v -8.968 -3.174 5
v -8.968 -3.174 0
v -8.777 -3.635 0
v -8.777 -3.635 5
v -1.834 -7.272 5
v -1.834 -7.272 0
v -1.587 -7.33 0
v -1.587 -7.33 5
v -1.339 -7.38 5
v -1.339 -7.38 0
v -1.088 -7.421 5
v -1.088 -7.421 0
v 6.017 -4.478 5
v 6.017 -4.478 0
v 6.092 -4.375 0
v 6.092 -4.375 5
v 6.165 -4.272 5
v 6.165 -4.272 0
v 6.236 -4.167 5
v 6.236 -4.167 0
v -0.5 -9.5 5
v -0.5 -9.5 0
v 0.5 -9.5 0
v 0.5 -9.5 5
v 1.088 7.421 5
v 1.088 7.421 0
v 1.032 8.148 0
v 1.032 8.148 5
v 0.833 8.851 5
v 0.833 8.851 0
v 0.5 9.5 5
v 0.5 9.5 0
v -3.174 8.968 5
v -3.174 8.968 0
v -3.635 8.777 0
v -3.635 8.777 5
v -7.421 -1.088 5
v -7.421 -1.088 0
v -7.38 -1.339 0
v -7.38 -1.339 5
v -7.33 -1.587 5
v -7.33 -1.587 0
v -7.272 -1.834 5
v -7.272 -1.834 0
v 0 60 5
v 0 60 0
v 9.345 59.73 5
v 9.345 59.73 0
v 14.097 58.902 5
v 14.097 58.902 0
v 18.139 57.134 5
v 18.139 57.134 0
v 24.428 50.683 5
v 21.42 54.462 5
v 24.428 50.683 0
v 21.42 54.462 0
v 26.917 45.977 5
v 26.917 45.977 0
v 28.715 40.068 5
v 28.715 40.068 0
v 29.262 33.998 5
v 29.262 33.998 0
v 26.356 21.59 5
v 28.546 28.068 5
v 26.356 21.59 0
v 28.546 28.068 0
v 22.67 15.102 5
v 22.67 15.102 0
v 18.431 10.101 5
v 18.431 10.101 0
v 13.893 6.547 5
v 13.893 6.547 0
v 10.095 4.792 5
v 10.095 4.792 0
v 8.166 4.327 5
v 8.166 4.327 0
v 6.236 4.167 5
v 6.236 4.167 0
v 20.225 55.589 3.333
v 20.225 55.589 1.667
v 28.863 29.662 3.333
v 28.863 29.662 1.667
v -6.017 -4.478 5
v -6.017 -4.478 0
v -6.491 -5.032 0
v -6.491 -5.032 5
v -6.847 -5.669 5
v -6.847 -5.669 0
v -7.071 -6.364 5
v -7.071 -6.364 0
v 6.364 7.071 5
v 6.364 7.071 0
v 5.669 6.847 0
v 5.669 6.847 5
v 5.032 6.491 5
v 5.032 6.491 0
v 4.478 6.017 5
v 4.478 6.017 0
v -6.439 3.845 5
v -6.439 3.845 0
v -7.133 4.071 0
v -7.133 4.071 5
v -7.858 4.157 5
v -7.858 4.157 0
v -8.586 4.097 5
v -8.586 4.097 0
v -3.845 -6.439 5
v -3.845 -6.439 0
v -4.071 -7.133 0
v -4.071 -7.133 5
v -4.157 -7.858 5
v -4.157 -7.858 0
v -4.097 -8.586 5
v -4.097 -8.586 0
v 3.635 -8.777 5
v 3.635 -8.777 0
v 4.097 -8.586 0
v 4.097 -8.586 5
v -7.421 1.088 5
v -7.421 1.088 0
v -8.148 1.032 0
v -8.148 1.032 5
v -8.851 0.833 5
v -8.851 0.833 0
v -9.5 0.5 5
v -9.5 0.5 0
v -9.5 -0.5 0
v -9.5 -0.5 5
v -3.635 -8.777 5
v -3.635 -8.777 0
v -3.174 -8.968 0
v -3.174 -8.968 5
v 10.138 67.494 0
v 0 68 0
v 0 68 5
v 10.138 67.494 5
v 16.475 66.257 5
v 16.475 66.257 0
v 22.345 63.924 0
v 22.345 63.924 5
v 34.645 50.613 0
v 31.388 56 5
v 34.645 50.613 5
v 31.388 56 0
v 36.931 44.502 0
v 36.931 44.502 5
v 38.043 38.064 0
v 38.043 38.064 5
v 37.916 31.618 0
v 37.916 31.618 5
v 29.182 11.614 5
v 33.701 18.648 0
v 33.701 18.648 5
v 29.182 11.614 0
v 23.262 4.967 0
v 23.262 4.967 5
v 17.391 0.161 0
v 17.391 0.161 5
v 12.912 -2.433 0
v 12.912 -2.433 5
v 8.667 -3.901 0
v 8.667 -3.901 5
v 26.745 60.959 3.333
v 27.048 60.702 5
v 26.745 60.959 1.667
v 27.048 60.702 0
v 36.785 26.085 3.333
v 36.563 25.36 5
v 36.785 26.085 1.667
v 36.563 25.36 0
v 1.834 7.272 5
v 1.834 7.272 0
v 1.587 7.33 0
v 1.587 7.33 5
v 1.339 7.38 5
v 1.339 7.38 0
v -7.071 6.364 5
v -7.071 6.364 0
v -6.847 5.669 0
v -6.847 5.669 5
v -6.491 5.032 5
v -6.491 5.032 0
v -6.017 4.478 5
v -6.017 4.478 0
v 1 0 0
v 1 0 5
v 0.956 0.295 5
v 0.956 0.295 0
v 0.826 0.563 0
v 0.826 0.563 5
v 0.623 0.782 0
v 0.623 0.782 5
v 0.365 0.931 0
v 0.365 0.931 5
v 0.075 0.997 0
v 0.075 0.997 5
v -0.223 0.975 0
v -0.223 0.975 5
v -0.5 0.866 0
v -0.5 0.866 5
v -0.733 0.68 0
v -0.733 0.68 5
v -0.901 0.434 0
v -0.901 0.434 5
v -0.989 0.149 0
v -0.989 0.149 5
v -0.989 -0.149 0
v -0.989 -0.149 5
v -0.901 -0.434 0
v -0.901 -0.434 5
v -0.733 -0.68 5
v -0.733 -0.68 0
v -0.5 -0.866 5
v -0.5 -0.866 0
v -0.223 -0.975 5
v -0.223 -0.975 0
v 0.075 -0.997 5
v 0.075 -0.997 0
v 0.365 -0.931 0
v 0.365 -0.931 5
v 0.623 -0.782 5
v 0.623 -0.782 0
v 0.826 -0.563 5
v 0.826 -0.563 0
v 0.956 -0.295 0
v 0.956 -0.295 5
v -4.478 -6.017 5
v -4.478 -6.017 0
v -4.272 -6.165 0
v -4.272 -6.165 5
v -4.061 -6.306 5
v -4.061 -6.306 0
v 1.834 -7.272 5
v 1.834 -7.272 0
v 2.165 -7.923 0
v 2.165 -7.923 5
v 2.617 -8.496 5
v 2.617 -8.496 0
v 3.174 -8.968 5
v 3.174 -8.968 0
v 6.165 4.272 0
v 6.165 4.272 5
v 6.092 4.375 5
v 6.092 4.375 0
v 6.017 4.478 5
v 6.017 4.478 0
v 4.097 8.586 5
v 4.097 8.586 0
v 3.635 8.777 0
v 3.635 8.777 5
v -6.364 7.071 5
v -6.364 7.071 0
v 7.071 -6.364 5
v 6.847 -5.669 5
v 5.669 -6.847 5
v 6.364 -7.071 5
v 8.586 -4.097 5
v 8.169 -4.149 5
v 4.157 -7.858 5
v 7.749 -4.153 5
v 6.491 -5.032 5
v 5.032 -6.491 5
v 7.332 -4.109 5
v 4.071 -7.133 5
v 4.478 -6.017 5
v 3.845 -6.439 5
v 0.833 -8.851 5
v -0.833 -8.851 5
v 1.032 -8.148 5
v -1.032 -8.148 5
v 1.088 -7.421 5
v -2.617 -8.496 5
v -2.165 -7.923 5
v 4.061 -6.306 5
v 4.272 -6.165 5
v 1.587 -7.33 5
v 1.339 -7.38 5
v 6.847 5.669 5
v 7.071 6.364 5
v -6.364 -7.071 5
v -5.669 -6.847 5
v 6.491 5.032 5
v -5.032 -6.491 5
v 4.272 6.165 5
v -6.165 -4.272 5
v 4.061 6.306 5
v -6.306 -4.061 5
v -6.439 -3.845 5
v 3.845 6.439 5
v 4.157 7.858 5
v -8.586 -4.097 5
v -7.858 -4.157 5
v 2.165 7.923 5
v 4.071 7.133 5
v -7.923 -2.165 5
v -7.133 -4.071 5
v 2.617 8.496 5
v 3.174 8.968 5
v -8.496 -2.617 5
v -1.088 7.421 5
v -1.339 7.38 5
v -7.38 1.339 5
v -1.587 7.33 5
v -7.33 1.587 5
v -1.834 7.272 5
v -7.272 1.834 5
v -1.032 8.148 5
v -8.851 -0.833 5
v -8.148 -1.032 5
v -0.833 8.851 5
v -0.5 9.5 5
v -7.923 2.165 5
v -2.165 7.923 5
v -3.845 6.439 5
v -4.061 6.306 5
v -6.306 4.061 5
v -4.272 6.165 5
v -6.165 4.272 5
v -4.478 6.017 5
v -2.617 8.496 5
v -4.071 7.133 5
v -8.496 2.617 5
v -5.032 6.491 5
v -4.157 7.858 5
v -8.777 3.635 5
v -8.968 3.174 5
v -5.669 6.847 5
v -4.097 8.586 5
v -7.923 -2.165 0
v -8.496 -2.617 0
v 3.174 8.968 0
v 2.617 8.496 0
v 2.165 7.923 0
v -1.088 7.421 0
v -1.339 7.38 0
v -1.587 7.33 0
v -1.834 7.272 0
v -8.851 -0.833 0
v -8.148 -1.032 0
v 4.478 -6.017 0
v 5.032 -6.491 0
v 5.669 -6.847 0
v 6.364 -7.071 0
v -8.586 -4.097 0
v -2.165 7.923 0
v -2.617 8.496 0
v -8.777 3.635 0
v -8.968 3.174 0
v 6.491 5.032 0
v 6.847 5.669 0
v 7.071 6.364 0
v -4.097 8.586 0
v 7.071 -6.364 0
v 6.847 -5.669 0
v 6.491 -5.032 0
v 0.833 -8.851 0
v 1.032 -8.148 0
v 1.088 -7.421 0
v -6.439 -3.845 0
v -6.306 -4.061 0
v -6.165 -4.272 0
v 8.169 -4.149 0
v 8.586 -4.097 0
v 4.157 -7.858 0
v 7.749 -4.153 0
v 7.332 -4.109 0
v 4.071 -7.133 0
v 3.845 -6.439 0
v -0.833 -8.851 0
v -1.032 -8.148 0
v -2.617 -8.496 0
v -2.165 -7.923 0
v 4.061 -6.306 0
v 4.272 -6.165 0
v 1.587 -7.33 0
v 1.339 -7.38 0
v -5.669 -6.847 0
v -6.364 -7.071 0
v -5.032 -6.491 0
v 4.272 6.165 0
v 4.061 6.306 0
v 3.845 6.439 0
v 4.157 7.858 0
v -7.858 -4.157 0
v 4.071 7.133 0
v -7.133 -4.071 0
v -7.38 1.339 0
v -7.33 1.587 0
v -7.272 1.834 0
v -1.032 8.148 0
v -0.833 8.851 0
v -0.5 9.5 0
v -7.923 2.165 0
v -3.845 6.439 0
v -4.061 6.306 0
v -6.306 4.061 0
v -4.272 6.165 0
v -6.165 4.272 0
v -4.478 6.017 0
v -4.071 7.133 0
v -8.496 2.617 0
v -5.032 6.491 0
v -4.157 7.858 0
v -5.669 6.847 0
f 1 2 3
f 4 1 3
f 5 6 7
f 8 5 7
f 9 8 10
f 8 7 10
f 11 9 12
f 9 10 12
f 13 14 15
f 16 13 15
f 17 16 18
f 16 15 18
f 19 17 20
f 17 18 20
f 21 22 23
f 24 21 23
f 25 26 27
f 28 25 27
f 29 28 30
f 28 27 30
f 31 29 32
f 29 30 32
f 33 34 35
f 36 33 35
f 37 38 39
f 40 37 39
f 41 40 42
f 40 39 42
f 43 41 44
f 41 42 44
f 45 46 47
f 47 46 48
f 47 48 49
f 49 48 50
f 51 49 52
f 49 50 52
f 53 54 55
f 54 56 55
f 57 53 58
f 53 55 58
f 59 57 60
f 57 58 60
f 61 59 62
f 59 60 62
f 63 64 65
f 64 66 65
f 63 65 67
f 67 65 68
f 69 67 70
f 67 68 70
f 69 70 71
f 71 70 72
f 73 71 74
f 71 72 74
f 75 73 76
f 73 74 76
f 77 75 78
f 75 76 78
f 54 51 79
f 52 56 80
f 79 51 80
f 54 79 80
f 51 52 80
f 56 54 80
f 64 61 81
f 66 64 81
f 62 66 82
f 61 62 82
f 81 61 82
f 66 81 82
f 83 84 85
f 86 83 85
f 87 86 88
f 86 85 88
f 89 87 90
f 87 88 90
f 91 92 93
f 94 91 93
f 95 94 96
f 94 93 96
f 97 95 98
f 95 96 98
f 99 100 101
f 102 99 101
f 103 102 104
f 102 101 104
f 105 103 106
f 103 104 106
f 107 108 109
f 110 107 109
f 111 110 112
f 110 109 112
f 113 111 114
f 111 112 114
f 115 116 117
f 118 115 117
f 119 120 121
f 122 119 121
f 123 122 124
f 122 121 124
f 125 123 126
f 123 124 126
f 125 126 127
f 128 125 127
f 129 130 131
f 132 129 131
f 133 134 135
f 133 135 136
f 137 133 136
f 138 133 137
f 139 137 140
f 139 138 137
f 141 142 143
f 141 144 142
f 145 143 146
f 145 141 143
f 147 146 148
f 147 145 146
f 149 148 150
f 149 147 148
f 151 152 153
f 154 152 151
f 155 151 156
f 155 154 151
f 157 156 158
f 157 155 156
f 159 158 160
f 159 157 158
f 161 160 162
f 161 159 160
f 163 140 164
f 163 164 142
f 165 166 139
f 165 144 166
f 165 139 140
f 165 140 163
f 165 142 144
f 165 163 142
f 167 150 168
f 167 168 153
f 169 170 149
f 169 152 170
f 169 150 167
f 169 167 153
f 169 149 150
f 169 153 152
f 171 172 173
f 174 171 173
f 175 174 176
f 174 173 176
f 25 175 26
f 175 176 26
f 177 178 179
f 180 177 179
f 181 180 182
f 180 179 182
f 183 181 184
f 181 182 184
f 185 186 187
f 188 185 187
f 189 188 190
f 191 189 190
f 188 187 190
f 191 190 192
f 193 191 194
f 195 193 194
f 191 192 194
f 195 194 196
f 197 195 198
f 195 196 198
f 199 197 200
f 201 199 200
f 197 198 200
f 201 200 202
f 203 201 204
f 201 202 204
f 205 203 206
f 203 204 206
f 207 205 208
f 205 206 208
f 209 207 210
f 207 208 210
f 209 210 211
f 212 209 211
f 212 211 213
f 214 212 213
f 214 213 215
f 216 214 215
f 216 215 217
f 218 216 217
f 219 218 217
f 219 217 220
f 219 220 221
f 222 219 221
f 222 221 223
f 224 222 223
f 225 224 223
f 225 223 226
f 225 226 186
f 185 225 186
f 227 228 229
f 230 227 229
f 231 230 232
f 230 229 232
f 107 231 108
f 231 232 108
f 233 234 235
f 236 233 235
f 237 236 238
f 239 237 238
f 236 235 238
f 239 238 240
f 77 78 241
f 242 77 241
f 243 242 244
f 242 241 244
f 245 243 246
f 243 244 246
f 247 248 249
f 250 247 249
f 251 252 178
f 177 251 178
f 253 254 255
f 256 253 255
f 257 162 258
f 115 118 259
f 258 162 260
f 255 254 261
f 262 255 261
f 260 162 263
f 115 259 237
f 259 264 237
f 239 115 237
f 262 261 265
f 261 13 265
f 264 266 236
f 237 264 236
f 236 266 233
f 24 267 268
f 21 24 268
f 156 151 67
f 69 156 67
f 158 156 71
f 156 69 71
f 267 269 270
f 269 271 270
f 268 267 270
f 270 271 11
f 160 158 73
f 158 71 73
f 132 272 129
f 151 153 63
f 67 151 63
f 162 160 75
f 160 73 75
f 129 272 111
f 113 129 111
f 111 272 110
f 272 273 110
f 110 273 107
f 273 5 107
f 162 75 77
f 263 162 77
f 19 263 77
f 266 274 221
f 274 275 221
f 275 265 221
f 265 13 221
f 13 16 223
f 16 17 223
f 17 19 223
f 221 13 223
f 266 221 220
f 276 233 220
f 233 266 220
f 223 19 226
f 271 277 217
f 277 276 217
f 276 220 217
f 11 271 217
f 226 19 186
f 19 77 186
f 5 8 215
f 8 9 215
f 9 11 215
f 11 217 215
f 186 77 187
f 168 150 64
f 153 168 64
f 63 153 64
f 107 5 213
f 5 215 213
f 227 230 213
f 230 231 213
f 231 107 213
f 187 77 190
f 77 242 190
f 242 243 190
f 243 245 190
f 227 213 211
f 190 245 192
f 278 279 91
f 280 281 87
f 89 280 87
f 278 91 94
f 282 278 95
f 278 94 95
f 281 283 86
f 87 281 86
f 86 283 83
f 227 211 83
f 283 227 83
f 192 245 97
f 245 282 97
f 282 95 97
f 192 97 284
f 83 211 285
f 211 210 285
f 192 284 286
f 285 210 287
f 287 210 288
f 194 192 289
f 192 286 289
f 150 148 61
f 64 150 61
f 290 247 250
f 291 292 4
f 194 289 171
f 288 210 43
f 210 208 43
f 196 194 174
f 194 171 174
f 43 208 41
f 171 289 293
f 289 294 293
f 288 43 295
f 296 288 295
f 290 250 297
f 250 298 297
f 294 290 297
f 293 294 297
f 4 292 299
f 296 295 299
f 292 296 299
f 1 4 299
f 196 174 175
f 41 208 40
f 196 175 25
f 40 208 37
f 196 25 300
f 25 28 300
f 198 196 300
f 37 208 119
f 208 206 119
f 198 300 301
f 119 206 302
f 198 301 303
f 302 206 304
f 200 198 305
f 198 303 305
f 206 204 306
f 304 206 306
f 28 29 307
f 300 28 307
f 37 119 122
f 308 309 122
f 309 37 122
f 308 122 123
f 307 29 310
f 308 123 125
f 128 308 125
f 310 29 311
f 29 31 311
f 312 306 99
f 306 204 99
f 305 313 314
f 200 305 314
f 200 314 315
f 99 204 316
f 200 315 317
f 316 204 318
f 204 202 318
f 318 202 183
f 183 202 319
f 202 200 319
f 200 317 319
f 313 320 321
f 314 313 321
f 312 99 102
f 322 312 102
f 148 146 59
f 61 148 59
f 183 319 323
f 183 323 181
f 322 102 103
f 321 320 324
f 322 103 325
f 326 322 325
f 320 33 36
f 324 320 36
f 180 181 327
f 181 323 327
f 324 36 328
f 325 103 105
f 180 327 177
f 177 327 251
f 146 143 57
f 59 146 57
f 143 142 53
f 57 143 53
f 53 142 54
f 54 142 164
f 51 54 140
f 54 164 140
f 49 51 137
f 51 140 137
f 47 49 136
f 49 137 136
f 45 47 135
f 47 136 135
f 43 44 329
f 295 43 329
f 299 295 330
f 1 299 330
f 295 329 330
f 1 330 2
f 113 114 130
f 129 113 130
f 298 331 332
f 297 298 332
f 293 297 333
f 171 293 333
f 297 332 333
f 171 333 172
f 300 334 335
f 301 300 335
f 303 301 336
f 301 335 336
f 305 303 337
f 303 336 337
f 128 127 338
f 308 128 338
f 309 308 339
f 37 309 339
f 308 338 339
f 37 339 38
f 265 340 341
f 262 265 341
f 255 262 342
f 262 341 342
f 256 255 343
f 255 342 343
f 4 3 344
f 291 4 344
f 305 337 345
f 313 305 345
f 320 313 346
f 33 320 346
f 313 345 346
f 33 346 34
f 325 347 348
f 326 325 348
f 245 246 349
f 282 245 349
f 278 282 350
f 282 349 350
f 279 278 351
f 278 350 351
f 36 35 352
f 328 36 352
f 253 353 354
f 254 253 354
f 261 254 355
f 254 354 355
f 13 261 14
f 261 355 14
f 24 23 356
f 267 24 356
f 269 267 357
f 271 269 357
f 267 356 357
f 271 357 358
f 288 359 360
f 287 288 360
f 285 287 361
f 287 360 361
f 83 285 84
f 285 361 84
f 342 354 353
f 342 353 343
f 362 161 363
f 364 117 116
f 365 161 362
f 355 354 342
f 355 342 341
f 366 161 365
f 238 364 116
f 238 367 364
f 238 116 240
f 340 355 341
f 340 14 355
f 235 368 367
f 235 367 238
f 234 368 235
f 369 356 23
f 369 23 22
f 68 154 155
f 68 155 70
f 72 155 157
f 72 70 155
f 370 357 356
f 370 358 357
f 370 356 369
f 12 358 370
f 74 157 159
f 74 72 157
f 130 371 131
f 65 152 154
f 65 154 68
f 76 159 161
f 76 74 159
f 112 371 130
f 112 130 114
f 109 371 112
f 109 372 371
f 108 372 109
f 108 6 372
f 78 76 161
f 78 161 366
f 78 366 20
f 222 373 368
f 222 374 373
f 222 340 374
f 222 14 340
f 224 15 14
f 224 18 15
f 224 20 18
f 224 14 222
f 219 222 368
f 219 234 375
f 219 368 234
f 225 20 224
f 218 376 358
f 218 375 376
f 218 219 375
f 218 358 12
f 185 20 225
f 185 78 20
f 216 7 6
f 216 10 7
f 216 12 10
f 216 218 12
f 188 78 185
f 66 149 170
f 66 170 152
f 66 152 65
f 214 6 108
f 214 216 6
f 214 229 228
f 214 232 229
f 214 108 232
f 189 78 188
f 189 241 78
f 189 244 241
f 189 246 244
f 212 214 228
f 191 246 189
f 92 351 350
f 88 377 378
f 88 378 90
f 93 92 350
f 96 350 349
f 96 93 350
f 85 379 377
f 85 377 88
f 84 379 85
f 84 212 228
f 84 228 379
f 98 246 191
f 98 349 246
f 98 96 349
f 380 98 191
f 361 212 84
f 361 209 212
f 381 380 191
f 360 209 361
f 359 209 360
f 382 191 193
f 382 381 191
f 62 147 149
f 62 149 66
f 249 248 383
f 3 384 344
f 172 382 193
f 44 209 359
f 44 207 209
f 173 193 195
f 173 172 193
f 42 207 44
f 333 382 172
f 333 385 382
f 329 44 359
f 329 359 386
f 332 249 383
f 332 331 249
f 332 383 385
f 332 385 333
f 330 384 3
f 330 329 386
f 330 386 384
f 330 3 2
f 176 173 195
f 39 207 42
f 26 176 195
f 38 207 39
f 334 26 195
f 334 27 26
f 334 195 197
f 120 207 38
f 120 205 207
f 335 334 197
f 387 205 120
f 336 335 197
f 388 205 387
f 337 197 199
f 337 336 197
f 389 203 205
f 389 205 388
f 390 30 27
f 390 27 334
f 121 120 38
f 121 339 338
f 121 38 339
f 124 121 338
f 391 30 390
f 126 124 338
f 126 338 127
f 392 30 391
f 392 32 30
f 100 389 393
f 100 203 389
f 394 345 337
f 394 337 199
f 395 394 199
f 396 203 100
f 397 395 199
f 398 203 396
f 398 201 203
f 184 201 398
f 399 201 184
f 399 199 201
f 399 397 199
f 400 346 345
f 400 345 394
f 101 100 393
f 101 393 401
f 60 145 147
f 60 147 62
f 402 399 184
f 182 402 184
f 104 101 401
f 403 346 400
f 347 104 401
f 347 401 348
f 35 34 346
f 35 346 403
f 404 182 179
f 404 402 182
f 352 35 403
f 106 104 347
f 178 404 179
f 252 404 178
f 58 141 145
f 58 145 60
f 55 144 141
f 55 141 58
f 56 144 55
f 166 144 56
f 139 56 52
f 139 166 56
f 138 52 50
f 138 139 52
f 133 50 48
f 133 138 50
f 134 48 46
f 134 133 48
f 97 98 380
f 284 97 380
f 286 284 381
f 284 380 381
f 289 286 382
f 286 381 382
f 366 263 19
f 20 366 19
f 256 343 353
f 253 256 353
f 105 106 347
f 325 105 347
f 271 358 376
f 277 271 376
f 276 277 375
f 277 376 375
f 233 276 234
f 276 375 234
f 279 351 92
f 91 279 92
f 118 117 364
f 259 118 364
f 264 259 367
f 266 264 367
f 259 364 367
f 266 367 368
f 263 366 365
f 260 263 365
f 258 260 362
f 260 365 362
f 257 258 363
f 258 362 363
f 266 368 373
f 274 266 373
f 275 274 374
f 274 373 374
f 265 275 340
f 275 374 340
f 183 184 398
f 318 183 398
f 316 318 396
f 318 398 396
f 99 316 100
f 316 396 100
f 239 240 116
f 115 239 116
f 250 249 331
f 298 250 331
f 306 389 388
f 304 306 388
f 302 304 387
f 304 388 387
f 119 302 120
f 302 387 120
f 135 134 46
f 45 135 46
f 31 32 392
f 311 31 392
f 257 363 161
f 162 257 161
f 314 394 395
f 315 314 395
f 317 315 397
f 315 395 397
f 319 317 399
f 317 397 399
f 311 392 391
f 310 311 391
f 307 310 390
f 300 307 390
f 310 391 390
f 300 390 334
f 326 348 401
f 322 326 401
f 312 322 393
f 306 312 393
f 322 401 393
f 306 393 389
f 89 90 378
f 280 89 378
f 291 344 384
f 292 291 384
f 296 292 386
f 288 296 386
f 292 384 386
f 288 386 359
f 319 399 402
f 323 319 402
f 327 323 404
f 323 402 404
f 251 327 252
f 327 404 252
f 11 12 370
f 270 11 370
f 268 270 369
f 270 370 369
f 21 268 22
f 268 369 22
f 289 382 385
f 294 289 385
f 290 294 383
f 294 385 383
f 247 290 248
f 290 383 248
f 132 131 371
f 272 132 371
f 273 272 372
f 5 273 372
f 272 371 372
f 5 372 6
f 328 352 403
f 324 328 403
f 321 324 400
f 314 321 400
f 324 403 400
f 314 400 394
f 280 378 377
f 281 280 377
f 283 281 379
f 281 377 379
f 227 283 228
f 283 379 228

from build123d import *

# Parameters (mm, degrees)
F1_DEPTH = 5
F2_R     = 1
F3_DEPTH = 5.001
F5_DEPTH = 5


with BuildPart() as f1:
    # F0 (on Top) → F1 (new body)
    with BuildSketch(Plane.XY):
        with BuildLine():
            ThreePointArc((7.4206173165, -1.0883191822), (7.4801280027, -0.5456052265), (7.5, 0))
            ThreePointArc((7.5, 0), (7.4801280027, 0.5456052265), (7.4206173165, 1.0883191822))
            ThreePointArc((7.4206173165, 1.0883191822), (7.355889603, 1.4631774151), (7.2722381774, 1.8342714877))
            ThreePointArc((7.2722381774, 1.8342714877), (6.9290964938, 2.8701257427), (6.4392747372, 3.8452231222))
            ThreePointArc((6.4392747372, 3.8452231222), (6.2360220923, 4.1667767476), (6.0167266989, 4.4776109513))
            ThreePointArc((6.0167266989, 4.4776109513), (5.3033008589, 5.3033008589), (4.4776109513, 6.0167266989))
            ThreePointArc((4.4776109513, 6.0167266989), (4.1667767476, 6.2360220923), (3.8452231222, 6.4392747372))
            ThreePointArc((3.8452231222, 6.4392747372), (2.8701257427, 6.9290964938), (1.8342714877, 7.2722381774))
            ThreePointArc((1.8342714877, 7.2722381774), (1.4631774151, 7.355889603), (1.0883191822, 7.4206173165))
            ThreePointArc((1.0883191822, 7.4206173165), (0.5456052265, 7.4801280027), (0, 7.5))
            ThreePointArc((0, 7.5), (-0.5456052265, 7.4801280027), (-1.0883191822, 7.4206173165))
            ThreePointArc((-1.0883191822, 7.4206173165), (-1.4631774151, 7.355889603), (-1.8342714877, 7.2722381774))
            ThreePointArc((-1.8342714877, 7.2722381774), (-2.8701257427, 6.9290964938), (-3.8452231222, 6.4392747372))
            ThreePointArc((-3.8452231222, 6.4392747372), (-4.1667767476, 6.2360220923), (-4.4776109513, 6.0167266989))
            ThreePointArc((-4.4776109513, 6.0167266989), (-5.3033008589, 5.3033008589), (-6.0167266989, 4.4776109513))
            ThreePointArc((-6.0167266989, 4.4776109513), (-6.2360220923, 4.1667767476), (-6.4392747372, 3.8452231222))
            ThreePointArc((-6.4392747372, 3.8452231222), (-6.9290964938, 2.8701257427), (-7.2722381774, 1.8342714877))
            ThreePointArc((-7.2722381774, 1.8342714877), (-7.355889603, 1.4631774151), (-7.4206173165, 1.0883191822))
            ThreePointArc((-7.4206173165, 1.0883191822), (-7.5, 0), (-7.4206173165, -1.0883191822))
            ThreePointArc((-7.4206173165, -1.0883191822), (-7.355889603, -1.4631774151), (-7.2722381774, -1.8342714877))
            ThreePointArc((-7.2722381774, -1.8342714877), (-6.9290964938, -2.8701257427), (-6.4392747372, -3.8452231222))
            ThreePointArc((-6.4392747372, -3.8452231222), (-6.2360220923, -4.1667767476), (-6.0167266989, -4.4776109513))
            ThreePointArc((-6.0167266989, -4.4776109513), (-5.3033008589, -5.3033008589), (-4.4776109513, -6.0167266989))
            ThreePointArc((-4.4776109513, -6.0167266989), (-4.1667767476, -6.2360220923), (-3.8452231222, -6.4392747372))
            ThreePointArc((-3.8452231222, -6.4392747372), (-2.8701257427, -6.9290964938), (-1.8342714877, -7.2722381774))
            ThreePointArc((-1.8342714877, -7.2722381774), (-1.4631774151, -7.355889603), (-1.0883191822, -7.4206173165))
            ThreePointArc((-1.0883191822, -7.4206173165), (0, -7.5), (1.0883191822, -7.4206173165))
            ThreePointArc((1.0883191822, -7.4206173165), (1.4631774151, -7.355889603), (1.8342714877, -7.2722381774))
            ThreePointArc((1.8342714877, -7.2722381774), (2.8701257427, -6.9290964938), (3.8452231222, -6.4392747372))
            ThreePointArc((3.8452231222, -6.4392747372), (4.1667767476, -6.2360220923), (4.4776109513, -6.0167266989))
            ThreePointArc((4.4776109513, -6.0167266989), (5.3033008589, -5.3033008589), (6.0167266989, -4.4776109513))
            ThreePointArc((6.0167266989, -4.4776109513), (6.2360220923, -4.1667767476), (6.4392747372, -3.8452231222))
            ThreePointArc((6.4392747372, -3.8452231222), (6.9290964938, -2.8701257427), (7.2722381774, -1.8342714877))
            ThreePointArc((7.2722381774, -1.8342714877), (7.355889603, -1.4631774151), (7.4206173165, -1.0883191822))
        make_face()
        with BuildLine():
            ThreePointArc((7.4206173165, 1.0883191822), (7.4801280027, 0.5456052265), (7.5, 0))
            ThreePointArc((7.5, 0), (7.4801280027, -0.5456052265), (7.4206173165, -1.0883191822))
            ThreePointArc((7.4206173165, -1.0883191822), (8.5043518229, -0.9498278009), (9.5, -0.5))
            Line((9.5, -0.5), (9.5, 0))
            Line((9.5, 0), (9.5, 0.5))
            ThreePointArc((9.5, 0.5), (8.5043518229, 0.9498278009), (7.4206173165, 1.0883191822))
        make_face()
        with BuildLine():
            ThreePointArc((6.4392747372, 3.8452231222), (6.9290964938, 2.8701257427), (7.2722381774, 1.8342714877))
            ThreePointArc((7.2722381774, 1.8342714877), (8.2204799494, 2.376948081), (8.968197275, 3.1735528412))
            Line((8.968197275, 3.1735528412), (8.7768555589, 3.6354926075))
            Line((8.7768555589, 3.6354926075), (8.5855138427, 4.0974323737))
            ThreePointArc((8.5855138427, 4.0974323737), (7.4935132234, 4.1320010103), (6.4392747372, 3.8452231222))
        make_face()
        with BuildLine():
            ThreePointArc((8.968197275, -3.1735528412), (8.2204799494, -2.376948081), (7.2722381774, -1.8342714877))
            ThreePointArc((7.2722381774, -1.8342714877), (6.9290964938, -2.8701257427), (6.4392747372, -3.8452231222))
            ThreePointArc((6.4392747372, -3.8452231222), (7.4935132234, -4.1320010103), (8.5855138427, -4.0974323737))
            Line((8.5855138427, -4.0974323737), (8.7768555589, -3.6354926075))
            Line((8.7768555589, -3.6354926075), (8.968197275, -3.1735528412))
        make_face()
        with BuildLine():
            ThreePointArc((4.4776109513, 6.0167266989), (5.3033008589, 5.3033008589), (6.0167266989, 4.4776109513))
            ThreePointArc((6.0167266989, 4.4776109513), (6.6851145225, 5.3418551646), (7.0710678119, 6.3639610307))
            Line((7.0710678119, 6.3639610307), (6.7175144213, 6.7175144213))
            Line((6.7175144213, 6.7175144213), (6.3639610307, 7.0710678119))
            ThreePointArc((6.3639610307, 7.0710678119), (5.3418551646, 6.6851145225), (4.4776109513, 6.0167266989))
        make_face()
        with BuildLine():
            ThreePointArc((7.0710678119, -6.3639610307), (6.6851145225, -5.3418551646), (6.0167266989, -4.4776109513))
            ThreePointArc((6.0167266989, -4.4776109513), (5.3033008589, -5.3033008589), (4.4776109513, -6.0167266989))
            ThreePointArc((4.4776109513, -6.0167266989), (5.3418551646, -6.6851145225), (6.3639610307, -7.0710678119))
            Line((6.3639610307, -7.0710678119), (6.7175144213, -6.7175144213))
            Line((6.7175144213, -6.7175144213), (7.0710678119, -6.3639610307))
        make_face()
        with BuildLine():
            ThreePointArc((1.8342714877, 7.2722381774), (2.8701257427, 6.9290964938), (3.8452231222, 6.4392747372))
            ThreePointArc((3.8452231222, 6.4392747372), (4.1320010103, 7.4935132234), (4.0974323737, 8.5855138427))
            Line((4.0974323737, 8.5855138427), (3.6354926075, 8.7768555589))
            Line((3.6354926075, 8.7768555589), (3.1735528412, 8.968197275))
            ThreePointArc((3.1735528412, 8.968197275), (2.376948081, 8.2204799494), (1.8342714877, 7.2722381774))
        make_face()
        with BuildLine():
            ThreePointArc((4.0974323737, -8.5855138427), (4.1320010103, -7.4935132234), (3.8452231222, -6.4392747372))
            ThreePointArc((3.8452231222, -6.4392747372), (2.8701257427, -6.9290964938), (1.8342714877, -7.2722381774))
            ThreePointArc((1.8342714877, -7.2722381774), (2.376948081, -8.2204799494), (3.1735528412, -8.968197275))
            Line((3.1735528412, -8.968197275), (3.6354926075, -8.7768555589))
            Line((3.6354926075, -8.7768555589), (4.0974323737, -8.5855138427))
        make_face()
        with BuildLine():
            ThreePointArc((0, 7.5), (0.5456052265, 7.4801280027), (1.0883191822, 7.4206173165))
            ThreePointArc((1.0883191822, 7.4206173165), (0.9498278009, 8.5043518229), (0.5, 9.5))
            Line((0.5, 9.5), (0, 9.5))
            Line((0, 9.5), (0, 7.5))
        make_face()
        with BuildLine():
            ThreePointArc((0.5, -9.5), (0.9498278009, -8.5043518229), (1.0883191822, -7.4206173165))
            ThreePointArc((1.0883191822, -7.4206173165), (0, -7.5), (-1.0883191822, -7.4206173165))
            ThreePointArc((-1.0883191822, -7.4206173165), (-0.9498278009, -8.5043518229), (-0.5, -9.5))
            Line((-0.5, -9.5), (0, -9.5))
            Line((0, -9.5), (0.5, -9.5))
        make_face()
        with BuildLine():
            ThreePointArc((-1.0883191822, 7.4206173165), (-0.5456052265, 7.4801280027), (0, 7.5))
            Line((0, 7.5), (0, 9.5))
            Line((0, 9.5), (-0.5, 9.5))
            ThreePointArc((-0.5, 9.5), (-0.9498278009, 8.5043518229), (-1.0883191822, 7.4206173165))
        make_face()
        with BuildLine():
            ThreePointArc((-3.1735528412, -8.968197275), (-2.376948081, -8.2204799494), (-1.8342714877, -7.2722381774))
            ThreePointArc((-1.8342714877, -7.2722381774), (-2.8701257427, -6.9290964938), (-3.8452231222, -6.4392747372))
            ThreePointArc((-3.8452231222, -6.4392747372), (-4.1320010103, -7.4935132234), (-4.0974323737, -8.5855138427))
            Line((-4.0974323737, -8.5855138427), (-3.6354926075, -8.7768555589))
            Line((-3.6354926075, -8.7768555589), (-3.1735528412, -8.968197275))
        make_face()
        with BuildLine():
            ThreePointArc((-3.8452231222, 6.4392747372), (-2.8701257427, 6.9290964938), (-1.8342714877, 7.2722381774))
            ThreePointArc((-1.8342714877, 7.2722381774), (-2.376948081, 8.2204799494), (-3.1735528412, 8.968197275))
            Line((-3.1735528412, 8.968197275), (-3.6354926075, 8.7768555589))
            Line((-3.6354926075, 8.7768555589), (-4.0974323737, 8.5855138427))
            ThreePointArc((-4.0974323737, 8.5855138427), (-4.1320010103, 7.4935132234), (-3.8452231222, 6.4392747372))
        make_face()
        with BuildLine():
            ThreePointArc((-6.3639610307, -7.0710678119), (-5.3418551646, -6.6851145225), (-4.4776109513, -6.0167266989))
            ThreePointArc((-4.4776109513, -6.0167266989), (-5.3033008589, -5.3033008589), (-6.0167266989, -4.4776109513))
            ThreePointArc((-6.0167266989, -4.4776109513), (-6.6851145225, -5.3418551646), (-7.0710678119, -6.3639610307))
            Line((-7.0710678119, -6.3639610307), (-6.7175144213, -6.7175144213))
            Line((-6.7175144213, -6.7175144213), (-6.3639610307, -7.0710678119))
        make_face()
        with BuildLine():
            ThreePointArc((-6.0167266989, 4.4776109513), (-5.3033008589, 5.3033008589), (-4.4776109513, 6.0167266989))
            ThreePointArc((-4.4776109513, 6.0167266989), (-5.3418551646, 6.6851145225), (-6.3639610307, 7.0710678119))
            Line((-6.3639610307, 7.0710678119), (-6.7175144213, 6.7175144213))
            Line((-6.7175144213, 6.7175144213), (-7.0710678119, 6.3639610307))
            ThreePointArc((-7.0710678119, 6.3639610307), (-6.6851145225, 5.3418551646), (-6.0167266989, 4.4776109513))
        make_face()
        with BuildLine():
            ThreePointArc((-8.5855138427, -4.0974323737), (-7.4935132234, -4.1320010103), (-6.4392747372, -3.8452231222))
            ThreePointArc((-6.4392747372, -3.8452231222), (-6.9290964938, -2.8701257427), (-7.2722381774, -1.8342714877))
            ThreePointArc((-7.2722381774, -1.8342714877), (-8.2204799494, -2.376948081), (-8.968197275, -3.1735528412))
            Line((-8.968197275, -3.1735528412), (-8.7768555589, -3.6354926075))
            Line((-8.7768555589, -3.6354926075), (-8.5855138427, -4.0974323737))
        make_face()
        with BuildLine():
            ThreePointArc((-7.2722381774, 1.8342714877), (-6.9290964938, 2.8701257427), (-6.4392747372, 3.8452231222))
            ThreePointArc((-6.4392747372, 3.8452231222), (-7.4935132234, 4.1320010103), (-8.5855138427, 4.0974323737))
            Line((-8.5855138427, 4.0974323737), (-8.7768555589, 3.6354926075))
            Line((-8.7768555589, 3.6354926075), (-8.968197275, 3.1735528412))
            ThreePointArc((-8.968197275, 3.1735528412), (-8.2204799494, 2.376948081), (-7.2722381774, 1.8342714877))
        make_face()
        with BuildLine():
            ThreePointArc((-9.5, -0.5), (-8.5043518229, -0.9498278009), (-7.4206173165, -1.0883191822))
            ThreePointArc((-7.4206173165, -1.0883191822), (-7.5, 0), (-7.4206173165, 1.0883191822))
            ThreePointArc((-7.4206173165, 1.0883191822), (-8.5043518229, 0.9498278009), (-9.5, 0.5))
            Line((-9.5, 0.5), (-9.5, 0))
            Line((-9.5, 0), (-9.5, -0.5))
        make_face()
    extrude(amount=F1_DEPTH)

    # F2 (on face) → F3 (cut, through all)
    with BuildSketch(Plane.XY.offset(5)):
        Circle(F2_R)
    extrude(amount=-F3_DEPTH, mode=Mode.SUBTRACT)

    # F4 (on Top) → F5 (join, through all)
    with BuildSketch(Plane.XY):
        with BuildLine():
            add(Edge.make_bspline(
                [(0, 68), (10, 68), (30.1655239133, 66.078145558), (47.1097466115, 24.8336379116), (16.2360220923, -4.1667767476), (6.2360220923, -4.1667767476)],
                knots=[0, 0, 0, 0, 0.2947825221, 0.6324594703, 1, 1, 1, 1], degree=3))
            Line((0, 68), (0, 60))
            add(Edge.make_bspline(
                [(0, 60), (10, 60), (21.529090744, 59.5696569591), (36.221671874, 29.2994392061), (16.2360220923, 4.1667767476), (6.2360220923, 4.1667767476)],
                knots=[0, 0, 0, 0, 0.291357855, 0.6261182487, 1, 1, 1, 1], degree=3))
            Line((6.2360220923, 4.1667767476), (6.2360220923, -4.1667767476))
        make_face()
    extrude(amount=F5_DEPTH)


solid = f1.part
